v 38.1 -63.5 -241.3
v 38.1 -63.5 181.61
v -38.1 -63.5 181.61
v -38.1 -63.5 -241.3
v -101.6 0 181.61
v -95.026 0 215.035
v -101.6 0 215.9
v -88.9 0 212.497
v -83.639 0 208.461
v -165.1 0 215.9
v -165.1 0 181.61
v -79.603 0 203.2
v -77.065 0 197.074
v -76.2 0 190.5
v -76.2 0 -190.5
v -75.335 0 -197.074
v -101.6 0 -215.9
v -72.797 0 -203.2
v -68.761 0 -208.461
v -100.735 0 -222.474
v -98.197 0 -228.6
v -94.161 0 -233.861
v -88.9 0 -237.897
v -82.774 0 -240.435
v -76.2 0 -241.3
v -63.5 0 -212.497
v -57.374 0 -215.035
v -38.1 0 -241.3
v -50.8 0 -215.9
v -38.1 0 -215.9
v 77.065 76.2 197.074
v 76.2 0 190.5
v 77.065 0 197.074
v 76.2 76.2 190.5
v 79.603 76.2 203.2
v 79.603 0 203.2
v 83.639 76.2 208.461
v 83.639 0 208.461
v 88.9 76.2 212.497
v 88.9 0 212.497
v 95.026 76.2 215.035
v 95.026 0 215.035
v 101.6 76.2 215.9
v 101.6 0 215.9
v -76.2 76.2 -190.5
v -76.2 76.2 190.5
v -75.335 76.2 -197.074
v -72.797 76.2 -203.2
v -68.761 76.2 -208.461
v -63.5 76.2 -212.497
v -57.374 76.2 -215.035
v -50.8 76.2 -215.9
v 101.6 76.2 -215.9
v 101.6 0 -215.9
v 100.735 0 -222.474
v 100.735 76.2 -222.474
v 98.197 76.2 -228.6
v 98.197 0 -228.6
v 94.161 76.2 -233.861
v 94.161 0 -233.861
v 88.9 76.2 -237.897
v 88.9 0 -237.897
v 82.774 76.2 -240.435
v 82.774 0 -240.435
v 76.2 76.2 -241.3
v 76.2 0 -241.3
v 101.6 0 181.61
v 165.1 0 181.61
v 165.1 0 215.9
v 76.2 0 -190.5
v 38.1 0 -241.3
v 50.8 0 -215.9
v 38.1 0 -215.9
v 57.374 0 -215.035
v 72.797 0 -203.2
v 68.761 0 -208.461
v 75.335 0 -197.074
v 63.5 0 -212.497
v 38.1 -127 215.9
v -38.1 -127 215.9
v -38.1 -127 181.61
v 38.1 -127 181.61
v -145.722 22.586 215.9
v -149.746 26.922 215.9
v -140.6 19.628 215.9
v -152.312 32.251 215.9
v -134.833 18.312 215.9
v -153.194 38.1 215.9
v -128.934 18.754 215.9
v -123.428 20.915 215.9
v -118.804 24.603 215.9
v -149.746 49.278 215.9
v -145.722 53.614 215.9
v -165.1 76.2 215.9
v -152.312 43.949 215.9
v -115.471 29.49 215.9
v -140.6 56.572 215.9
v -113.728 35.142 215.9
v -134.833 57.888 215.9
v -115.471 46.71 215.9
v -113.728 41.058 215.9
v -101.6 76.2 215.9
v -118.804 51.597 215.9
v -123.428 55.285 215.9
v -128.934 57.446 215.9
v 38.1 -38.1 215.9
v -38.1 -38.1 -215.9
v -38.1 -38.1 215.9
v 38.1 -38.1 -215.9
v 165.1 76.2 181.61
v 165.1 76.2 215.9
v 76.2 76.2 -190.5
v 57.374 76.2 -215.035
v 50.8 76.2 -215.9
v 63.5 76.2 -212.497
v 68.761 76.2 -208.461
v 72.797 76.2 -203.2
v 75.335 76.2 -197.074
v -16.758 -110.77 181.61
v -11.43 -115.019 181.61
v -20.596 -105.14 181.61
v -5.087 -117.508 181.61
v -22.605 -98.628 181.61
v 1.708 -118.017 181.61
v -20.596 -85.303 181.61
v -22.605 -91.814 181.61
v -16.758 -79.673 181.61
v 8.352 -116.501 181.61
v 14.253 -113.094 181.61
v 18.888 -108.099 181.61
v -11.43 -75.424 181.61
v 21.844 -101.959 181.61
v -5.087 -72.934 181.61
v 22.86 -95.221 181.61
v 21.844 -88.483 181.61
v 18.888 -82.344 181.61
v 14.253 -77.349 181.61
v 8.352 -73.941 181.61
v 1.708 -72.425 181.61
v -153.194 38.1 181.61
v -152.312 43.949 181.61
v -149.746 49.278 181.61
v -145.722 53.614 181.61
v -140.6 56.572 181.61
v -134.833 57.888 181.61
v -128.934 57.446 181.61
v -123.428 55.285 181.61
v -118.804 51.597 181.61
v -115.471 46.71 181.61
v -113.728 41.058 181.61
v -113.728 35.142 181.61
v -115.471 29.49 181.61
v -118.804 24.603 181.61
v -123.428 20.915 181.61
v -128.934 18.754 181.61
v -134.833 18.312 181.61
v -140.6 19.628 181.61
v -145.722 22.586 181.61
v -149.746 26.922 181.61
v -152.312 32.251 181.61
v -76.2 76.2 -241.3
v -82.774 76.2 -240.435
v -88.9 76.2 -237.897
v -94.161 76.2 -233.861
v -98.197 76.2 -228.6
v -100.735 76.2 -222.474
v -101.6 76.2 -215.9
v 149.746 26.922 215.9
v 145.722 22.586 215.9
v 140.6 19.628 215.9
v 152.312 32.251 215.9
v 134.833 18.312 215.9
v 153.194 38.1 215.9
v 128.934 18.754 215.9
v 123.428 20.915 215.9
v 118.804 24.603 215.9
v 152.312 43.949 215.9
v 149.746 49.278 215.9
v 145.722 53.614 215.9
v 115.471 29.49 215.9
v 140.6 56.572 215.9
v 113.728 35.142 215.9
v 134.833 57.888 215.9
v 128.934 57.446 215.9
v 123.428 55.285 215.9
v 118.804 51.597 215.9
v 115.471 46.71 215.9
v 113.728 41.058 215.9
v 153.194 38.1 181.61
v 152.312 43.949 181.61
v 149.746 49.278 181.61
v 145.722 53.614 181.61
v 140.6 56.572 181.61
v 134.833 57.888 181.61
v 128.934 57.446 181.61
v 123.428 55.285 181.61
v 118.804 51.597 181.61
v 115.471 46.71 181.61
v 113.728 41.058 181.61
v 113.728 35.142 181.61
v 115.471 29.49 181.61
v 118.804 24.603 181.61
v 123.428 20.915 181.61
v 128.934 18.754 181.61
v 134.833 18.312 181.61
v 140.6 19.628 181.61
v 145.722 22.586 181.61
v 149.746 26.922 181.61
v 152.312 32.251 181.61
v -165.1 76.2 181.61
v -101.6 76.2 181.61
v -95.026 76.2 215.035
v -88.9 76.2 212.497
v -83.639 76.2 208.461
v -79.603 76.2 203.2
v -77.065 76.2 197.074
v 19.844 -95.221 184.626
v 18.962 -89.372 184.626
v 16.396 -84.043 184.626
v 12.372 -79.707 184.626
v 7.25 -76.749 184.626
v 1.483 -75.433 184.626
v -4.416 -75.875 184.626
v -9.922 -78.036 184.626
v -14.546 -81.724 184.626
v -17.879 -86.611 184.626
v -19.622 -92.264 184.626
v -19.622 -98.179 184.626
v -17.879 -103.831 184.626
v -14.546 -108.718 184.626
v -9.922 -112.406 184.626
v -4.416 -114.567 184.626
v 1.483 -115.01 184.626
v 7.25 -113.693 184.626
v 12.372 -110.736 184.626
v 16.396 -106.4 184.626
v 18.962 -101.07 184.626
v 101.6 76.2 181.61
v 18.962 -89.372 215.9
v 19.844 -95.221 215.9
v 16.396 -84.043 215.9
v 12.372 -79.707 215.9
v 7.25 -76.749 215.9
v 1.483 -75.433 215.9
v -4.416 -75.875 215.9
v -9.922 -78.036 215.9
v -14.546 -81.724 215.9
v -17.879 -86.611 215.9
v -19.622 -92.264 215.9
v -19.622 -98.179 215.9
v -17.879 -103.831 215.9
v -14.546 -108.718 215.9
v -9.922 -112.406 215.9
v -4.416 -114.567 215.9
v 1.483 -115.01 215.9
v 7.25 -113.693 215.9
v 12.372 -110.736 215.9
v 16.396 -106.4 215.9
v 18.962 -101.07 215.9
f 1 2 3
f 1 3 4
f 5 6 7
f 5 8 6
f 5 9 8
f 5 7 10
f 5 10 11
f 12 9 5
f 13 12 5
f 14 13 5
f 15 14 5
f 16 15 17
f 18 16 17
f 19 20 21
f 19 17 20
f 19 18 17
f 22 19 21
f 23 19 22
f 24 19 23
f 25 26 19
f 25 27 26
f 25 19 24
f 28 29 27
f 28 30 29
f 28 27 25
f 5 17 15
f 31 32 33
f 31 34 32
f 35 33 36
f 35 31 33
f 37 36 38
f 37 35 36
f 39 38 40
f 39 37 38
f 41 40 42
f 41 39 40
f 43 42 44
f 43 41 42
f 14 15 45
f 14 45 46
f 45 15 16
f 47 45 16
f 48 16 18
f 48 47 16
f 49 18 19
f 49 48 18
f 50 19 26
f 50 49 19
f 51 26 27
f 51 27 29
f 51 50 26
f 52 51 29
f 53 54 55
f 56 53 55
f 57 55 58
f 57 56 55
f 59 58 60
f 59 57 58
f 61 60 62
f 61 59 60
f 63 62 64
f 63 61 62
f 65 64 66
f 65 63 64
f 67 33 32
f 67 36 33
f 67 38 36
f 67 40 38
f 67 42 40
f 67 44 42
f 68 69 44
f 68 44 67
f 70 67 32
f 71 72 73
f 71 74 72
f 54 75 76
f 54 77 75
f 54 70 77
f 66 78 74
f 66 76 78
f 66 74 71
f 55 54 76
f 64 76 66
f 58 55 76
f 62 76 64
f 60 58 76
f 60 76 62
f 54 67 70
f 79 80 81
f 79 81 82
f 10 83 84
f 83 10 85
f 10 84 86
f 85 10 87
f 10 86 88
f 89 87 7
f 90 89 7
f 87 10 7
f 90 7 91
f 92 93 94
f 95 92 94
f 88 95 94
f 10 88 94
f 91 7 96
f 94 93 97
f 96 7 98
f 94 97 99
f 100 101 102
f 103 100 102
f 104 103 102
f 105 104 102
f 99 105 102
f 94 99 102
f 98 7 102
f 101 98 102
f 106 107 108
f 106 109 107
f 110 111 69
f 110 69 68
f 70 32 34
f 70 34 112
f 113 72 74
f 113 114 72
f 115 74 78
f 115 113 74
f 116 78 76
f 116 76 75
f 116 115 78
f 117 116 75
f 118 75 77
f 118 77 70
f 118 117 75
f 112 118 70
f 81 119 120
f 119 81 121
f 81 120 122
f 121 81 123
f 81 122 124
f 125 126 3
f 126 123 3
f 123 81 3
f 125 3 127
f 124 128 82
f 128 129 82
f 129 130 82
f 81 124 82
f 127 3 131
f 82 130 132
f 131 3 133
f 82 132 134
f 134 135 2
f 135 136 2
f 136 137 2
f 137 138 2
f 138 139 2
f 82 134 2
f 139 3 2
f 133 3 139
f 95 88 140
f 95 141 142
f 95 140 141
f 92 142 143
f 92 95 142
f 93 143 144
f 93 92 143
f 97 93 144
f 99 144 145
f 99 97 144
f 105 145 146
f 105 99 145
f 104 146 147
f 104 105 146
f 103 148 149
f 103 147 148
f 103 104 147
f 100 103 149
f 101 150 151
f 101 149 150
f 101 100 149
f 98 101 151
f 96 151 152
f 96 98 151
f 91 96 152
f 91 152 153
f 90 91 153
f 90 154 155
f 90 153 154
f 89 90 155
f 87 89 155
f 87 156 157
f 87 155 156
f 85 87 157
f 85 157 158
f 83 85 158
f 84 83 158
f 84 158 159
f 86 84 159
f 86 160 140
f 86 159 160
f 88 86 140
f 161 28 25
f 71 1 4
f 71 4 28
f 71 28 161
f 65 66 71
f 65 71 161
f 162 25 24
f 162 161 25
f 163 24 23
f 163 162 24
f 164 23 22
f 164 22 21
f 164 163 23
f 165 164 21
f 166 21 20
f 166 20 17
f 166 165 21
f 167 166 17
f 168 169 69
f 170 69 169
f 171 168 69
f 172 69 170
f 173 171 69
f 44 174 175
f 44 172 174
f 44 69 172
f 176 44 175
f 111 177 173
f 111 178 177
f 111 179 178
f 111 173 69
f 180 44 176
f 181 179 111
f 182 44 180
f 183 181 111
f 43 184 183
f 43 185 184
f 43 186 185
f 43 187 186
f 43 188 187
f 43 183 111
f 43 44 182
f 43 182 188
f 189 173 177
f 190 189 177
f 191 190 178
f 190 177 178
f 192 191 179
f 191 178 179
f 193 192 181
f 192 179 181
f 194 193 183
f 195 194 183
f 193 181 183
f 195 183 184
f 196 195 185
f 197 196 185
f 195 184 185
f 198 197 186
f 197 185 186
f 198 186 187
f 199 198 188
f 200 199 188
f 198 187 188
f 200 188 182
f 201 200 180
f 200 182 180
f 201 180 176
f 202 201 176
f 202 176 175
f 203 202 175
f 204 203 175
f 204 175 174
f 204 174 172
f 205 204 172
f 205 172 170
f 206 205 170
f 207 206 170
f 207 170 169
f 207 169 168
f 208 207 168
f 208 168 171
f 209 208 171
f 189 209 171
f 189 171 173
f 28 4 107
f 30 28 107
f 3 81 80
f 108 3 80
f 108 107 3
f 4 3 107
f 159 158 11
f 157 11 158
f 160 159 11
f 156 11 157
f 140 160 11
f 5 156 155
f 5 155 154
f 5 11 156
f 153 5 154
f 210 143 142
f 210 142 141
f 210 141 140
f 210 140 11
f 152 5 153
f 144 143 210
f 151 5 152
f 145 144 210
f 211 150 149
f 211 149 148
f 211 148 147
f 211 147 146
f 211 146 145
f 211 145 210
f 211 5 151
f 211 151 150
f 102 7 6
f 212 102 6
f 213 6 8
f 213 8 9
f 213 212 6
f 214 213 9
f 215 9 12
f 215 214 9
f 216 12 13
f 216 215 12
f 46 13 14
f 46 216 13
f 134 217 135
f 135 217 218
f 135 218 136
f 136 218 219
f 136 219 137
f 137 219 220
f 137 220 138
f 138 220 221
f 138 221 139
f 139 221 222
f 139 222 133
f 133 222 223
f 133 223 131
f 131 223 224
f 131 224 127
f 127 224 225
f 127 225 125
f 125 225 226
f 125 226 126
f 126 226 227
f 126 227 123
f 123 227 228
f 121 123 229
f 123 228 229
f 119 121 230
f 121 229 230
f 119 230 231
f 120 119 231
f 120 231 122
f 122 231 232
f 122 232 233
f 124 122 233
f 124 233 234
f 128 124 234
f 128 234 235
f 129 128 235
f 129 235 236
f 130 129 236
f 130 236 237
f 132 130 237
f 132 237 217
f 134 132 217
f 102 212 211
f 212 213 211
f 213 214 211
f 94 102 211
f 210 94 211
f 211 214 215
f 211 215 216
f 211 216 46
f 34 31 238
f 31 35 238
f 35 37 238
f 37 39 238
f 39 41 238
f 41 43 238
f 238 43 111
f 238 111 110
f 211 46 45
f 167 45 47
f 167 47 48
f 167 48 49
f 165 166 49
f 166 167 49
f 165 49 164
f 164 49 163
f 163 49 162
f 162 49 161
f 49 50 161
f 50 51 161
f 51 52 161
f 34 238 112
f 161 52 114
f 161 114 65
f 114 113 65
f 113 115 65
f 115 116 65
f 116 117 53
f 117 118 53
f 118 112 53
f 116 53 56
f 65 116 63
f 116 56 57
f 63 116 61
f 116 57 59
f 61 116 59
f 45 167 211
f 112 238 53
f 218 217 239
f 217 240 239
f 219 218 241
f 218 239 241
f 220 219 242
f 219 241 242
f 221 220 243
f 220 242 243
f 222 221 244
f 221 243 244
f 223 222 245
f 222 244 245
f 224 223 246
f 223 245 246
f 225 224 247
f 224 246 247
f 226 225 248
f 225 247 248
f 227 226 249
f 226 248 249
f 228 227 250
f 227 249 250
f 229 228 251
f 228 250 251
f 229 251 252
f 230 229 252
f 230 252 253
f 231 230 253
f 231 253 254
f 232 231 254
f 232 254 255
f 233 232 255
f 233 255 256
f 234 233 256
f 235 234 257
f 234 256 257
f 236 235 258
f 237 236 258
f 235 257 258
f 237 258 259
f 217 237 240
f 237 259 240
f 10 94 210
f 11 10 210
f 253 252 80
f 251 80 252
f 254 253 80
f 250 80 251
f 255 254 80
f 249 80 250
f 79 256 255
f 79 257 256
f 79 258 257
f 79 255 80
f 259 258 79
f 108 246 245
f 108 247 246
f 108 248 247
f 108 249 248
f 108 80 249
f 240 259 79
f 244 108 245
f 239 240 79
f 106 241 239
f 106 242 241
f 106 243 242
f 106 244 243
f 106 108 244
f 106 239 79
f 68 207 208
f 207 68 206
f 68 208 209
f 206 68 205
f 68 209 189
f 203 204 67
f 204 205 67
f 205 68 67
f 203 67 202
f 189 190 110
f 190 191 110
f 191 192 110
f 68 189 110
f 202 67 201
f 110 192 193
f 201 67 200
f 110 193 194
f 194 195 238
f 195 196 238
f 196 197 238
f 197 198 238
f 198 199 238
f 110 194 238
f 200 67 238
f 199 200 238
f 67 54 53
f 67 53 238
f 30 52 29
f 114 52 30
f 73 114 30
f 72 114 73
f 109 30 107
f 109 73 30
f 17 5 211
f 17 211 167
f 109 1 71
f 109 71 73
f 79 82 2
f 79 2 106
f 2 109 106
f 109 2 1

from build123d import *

# Parameters (mm, degrees)
BOSS_EXTRUDE1_DEPTH                = 76.2
SKETCH3_W                          = 34.29
SKETCH3_H                          = 76.2
BOSS_EXTRUDE2_DEPTH                = 63.5
FILLET1_R                          = 25.4
FILLET2_R                          = 25.4
F_1_3_4_5_TAPPED_HOLE1_D           = 39.6875
BOSS_EXTRUDE3_DEPTH                = 38.1
SKETCH10_W                         = 76.2
SKETCH10_H                         = 34.29
BOSS_EXTRUDE4_DEPTH                = 63.5
F_1_3_4_5_TAPPED_HOLE2_D           = 39.6875
F_1_3_4_5_TAPPED_HOLE2_CSINK_D     = 45.72
F_1_3_4_5_TAPPED_HOLE2_CSINK_ANGLE = 90


with BuildPart() as part:
    # Sketch2 → Boss-Extrude1 (new body)
    with BuildSketch(Plane(origin=(0, 0, 0), x_dir=(1, 0, 0), z_dir=(0, 1, 0))):
        Polygon((-101.6, -215.9), (-101.6, 241.3), (101.6, 241.3), (101.6, -215.9), (76.2, -215.9), (76.2, 215.9), (-76.2, 215.9), (-76.2, -215.9), align=None)
    extrude(amount=BOSS_EXTRUDE1_DEPTH)

    # Sketch3 → Boss-Extrude2 (add)
    with BuildSketch(Plane(origin=(101.6, 0, 0), x_dir=(0, 0, -1), z_dir=(1, 0, 0))):
        with Locations((-198.755, 38.1)):
            Rectangle(SKETCH3_W, SKETCH3_H)
    boss_extrude2 = extrude(amount=BOSS_EXTRUDE2_DEPTH)

    # Mirror1: Boss-Extrude2 across plane
    add(boss_extrude2.mirror(Plane(origin=(0, 0, 0), x_dir=(0, 0, 1), z_dir=(1, 0, 0))))

    # Fillet1
    fillet1_edges = [part.edges().sort_by_distance(p)[0] for p in [
        (-76.2, 38.1, 215.9),
        (-101.6, 38.1, -241.3),
        (101.6, 38.1, -241.3),
        (76.2, 38.1, 215.9),
    ]]
    fillet(fillet1_edges, radius=FILLET1_R)

    # Fillet2
    fillet2_edges = [part.edges().sort_by_distance(p)[0] for p in [
        (76.2, 38.1, -215.9),
        (-76.2, 38.1, -215.9),
    ]]
    fillet(fillet2_edges, radius=FILLET2_R)

    # 1-3/4-5 Tapped Hole1 (through all)
    with Locations(Plane(origin=(0, 0, 181.61), x_dir=(-1, 0, 0), z_dir=(0, 0, -1))):
        with Locations((-133.35, 38.1)):
            f_1_3_4_5_tapped_hole1 = Hole(F_1_3_4_5_TAPPED_HOLE1_D / 2)

    # Mirror2: 1-3/4-5 Tapped Hole1 across plane
    add(f_1_3_4_5_tapped_hole1.mirror(Plane(origin=(0, 0, 0), x_dir=(0, 0, 1), z_dir=(1, 0, 0))), mode=Mode.SUBTRACT)

    # Sketch9 → Boss-Extrude3 (add, symmetric)
    with BuildSketch(Plane(origin=(0, 0, 0), x_dir=(0, 0, -1), z_dir=(1, 0, 0))):
        Polygon((-215.9, -63.5), (241.3, -63.5), (241.3, 38.1), (215.9, 38.1), (215.9, -38.1), (-215.9, -38.1), align=None)
    extrude(amount=BOSS_EXTRUDE3_DEPTH, both=True)

    # Sketch10 → Boss-Extrude4 (add)
    with BuildSketch(Plane.XZ.offset(63.5)):
        with Locations((0, 198.755)):
            Rectangle(SKETCH10_W, SKETCH10_H)
    extrude(amount=BOSS_EXTRUDE4_DEPTH)

    # 1-3/4-5 Tapped Hole2 (through all)
    with Locations(Plane(origin=(0, 0, 181.61), x_dir=(-1, 0, 0), z_dir=(0, 0, -1))):
        with Locations((0, -95.221260733)):
            CounterSinkHole(F_1_3_4_5_TAPPED_HOLE2_D / 2, F_1_3_4_5_TAPPED_HOLE2_CSINK_D / 2, counter_sink_angle=F_1_3_4_5_TAPPED_HOLE2_CSINK_ANGLE)


solid = part.part
